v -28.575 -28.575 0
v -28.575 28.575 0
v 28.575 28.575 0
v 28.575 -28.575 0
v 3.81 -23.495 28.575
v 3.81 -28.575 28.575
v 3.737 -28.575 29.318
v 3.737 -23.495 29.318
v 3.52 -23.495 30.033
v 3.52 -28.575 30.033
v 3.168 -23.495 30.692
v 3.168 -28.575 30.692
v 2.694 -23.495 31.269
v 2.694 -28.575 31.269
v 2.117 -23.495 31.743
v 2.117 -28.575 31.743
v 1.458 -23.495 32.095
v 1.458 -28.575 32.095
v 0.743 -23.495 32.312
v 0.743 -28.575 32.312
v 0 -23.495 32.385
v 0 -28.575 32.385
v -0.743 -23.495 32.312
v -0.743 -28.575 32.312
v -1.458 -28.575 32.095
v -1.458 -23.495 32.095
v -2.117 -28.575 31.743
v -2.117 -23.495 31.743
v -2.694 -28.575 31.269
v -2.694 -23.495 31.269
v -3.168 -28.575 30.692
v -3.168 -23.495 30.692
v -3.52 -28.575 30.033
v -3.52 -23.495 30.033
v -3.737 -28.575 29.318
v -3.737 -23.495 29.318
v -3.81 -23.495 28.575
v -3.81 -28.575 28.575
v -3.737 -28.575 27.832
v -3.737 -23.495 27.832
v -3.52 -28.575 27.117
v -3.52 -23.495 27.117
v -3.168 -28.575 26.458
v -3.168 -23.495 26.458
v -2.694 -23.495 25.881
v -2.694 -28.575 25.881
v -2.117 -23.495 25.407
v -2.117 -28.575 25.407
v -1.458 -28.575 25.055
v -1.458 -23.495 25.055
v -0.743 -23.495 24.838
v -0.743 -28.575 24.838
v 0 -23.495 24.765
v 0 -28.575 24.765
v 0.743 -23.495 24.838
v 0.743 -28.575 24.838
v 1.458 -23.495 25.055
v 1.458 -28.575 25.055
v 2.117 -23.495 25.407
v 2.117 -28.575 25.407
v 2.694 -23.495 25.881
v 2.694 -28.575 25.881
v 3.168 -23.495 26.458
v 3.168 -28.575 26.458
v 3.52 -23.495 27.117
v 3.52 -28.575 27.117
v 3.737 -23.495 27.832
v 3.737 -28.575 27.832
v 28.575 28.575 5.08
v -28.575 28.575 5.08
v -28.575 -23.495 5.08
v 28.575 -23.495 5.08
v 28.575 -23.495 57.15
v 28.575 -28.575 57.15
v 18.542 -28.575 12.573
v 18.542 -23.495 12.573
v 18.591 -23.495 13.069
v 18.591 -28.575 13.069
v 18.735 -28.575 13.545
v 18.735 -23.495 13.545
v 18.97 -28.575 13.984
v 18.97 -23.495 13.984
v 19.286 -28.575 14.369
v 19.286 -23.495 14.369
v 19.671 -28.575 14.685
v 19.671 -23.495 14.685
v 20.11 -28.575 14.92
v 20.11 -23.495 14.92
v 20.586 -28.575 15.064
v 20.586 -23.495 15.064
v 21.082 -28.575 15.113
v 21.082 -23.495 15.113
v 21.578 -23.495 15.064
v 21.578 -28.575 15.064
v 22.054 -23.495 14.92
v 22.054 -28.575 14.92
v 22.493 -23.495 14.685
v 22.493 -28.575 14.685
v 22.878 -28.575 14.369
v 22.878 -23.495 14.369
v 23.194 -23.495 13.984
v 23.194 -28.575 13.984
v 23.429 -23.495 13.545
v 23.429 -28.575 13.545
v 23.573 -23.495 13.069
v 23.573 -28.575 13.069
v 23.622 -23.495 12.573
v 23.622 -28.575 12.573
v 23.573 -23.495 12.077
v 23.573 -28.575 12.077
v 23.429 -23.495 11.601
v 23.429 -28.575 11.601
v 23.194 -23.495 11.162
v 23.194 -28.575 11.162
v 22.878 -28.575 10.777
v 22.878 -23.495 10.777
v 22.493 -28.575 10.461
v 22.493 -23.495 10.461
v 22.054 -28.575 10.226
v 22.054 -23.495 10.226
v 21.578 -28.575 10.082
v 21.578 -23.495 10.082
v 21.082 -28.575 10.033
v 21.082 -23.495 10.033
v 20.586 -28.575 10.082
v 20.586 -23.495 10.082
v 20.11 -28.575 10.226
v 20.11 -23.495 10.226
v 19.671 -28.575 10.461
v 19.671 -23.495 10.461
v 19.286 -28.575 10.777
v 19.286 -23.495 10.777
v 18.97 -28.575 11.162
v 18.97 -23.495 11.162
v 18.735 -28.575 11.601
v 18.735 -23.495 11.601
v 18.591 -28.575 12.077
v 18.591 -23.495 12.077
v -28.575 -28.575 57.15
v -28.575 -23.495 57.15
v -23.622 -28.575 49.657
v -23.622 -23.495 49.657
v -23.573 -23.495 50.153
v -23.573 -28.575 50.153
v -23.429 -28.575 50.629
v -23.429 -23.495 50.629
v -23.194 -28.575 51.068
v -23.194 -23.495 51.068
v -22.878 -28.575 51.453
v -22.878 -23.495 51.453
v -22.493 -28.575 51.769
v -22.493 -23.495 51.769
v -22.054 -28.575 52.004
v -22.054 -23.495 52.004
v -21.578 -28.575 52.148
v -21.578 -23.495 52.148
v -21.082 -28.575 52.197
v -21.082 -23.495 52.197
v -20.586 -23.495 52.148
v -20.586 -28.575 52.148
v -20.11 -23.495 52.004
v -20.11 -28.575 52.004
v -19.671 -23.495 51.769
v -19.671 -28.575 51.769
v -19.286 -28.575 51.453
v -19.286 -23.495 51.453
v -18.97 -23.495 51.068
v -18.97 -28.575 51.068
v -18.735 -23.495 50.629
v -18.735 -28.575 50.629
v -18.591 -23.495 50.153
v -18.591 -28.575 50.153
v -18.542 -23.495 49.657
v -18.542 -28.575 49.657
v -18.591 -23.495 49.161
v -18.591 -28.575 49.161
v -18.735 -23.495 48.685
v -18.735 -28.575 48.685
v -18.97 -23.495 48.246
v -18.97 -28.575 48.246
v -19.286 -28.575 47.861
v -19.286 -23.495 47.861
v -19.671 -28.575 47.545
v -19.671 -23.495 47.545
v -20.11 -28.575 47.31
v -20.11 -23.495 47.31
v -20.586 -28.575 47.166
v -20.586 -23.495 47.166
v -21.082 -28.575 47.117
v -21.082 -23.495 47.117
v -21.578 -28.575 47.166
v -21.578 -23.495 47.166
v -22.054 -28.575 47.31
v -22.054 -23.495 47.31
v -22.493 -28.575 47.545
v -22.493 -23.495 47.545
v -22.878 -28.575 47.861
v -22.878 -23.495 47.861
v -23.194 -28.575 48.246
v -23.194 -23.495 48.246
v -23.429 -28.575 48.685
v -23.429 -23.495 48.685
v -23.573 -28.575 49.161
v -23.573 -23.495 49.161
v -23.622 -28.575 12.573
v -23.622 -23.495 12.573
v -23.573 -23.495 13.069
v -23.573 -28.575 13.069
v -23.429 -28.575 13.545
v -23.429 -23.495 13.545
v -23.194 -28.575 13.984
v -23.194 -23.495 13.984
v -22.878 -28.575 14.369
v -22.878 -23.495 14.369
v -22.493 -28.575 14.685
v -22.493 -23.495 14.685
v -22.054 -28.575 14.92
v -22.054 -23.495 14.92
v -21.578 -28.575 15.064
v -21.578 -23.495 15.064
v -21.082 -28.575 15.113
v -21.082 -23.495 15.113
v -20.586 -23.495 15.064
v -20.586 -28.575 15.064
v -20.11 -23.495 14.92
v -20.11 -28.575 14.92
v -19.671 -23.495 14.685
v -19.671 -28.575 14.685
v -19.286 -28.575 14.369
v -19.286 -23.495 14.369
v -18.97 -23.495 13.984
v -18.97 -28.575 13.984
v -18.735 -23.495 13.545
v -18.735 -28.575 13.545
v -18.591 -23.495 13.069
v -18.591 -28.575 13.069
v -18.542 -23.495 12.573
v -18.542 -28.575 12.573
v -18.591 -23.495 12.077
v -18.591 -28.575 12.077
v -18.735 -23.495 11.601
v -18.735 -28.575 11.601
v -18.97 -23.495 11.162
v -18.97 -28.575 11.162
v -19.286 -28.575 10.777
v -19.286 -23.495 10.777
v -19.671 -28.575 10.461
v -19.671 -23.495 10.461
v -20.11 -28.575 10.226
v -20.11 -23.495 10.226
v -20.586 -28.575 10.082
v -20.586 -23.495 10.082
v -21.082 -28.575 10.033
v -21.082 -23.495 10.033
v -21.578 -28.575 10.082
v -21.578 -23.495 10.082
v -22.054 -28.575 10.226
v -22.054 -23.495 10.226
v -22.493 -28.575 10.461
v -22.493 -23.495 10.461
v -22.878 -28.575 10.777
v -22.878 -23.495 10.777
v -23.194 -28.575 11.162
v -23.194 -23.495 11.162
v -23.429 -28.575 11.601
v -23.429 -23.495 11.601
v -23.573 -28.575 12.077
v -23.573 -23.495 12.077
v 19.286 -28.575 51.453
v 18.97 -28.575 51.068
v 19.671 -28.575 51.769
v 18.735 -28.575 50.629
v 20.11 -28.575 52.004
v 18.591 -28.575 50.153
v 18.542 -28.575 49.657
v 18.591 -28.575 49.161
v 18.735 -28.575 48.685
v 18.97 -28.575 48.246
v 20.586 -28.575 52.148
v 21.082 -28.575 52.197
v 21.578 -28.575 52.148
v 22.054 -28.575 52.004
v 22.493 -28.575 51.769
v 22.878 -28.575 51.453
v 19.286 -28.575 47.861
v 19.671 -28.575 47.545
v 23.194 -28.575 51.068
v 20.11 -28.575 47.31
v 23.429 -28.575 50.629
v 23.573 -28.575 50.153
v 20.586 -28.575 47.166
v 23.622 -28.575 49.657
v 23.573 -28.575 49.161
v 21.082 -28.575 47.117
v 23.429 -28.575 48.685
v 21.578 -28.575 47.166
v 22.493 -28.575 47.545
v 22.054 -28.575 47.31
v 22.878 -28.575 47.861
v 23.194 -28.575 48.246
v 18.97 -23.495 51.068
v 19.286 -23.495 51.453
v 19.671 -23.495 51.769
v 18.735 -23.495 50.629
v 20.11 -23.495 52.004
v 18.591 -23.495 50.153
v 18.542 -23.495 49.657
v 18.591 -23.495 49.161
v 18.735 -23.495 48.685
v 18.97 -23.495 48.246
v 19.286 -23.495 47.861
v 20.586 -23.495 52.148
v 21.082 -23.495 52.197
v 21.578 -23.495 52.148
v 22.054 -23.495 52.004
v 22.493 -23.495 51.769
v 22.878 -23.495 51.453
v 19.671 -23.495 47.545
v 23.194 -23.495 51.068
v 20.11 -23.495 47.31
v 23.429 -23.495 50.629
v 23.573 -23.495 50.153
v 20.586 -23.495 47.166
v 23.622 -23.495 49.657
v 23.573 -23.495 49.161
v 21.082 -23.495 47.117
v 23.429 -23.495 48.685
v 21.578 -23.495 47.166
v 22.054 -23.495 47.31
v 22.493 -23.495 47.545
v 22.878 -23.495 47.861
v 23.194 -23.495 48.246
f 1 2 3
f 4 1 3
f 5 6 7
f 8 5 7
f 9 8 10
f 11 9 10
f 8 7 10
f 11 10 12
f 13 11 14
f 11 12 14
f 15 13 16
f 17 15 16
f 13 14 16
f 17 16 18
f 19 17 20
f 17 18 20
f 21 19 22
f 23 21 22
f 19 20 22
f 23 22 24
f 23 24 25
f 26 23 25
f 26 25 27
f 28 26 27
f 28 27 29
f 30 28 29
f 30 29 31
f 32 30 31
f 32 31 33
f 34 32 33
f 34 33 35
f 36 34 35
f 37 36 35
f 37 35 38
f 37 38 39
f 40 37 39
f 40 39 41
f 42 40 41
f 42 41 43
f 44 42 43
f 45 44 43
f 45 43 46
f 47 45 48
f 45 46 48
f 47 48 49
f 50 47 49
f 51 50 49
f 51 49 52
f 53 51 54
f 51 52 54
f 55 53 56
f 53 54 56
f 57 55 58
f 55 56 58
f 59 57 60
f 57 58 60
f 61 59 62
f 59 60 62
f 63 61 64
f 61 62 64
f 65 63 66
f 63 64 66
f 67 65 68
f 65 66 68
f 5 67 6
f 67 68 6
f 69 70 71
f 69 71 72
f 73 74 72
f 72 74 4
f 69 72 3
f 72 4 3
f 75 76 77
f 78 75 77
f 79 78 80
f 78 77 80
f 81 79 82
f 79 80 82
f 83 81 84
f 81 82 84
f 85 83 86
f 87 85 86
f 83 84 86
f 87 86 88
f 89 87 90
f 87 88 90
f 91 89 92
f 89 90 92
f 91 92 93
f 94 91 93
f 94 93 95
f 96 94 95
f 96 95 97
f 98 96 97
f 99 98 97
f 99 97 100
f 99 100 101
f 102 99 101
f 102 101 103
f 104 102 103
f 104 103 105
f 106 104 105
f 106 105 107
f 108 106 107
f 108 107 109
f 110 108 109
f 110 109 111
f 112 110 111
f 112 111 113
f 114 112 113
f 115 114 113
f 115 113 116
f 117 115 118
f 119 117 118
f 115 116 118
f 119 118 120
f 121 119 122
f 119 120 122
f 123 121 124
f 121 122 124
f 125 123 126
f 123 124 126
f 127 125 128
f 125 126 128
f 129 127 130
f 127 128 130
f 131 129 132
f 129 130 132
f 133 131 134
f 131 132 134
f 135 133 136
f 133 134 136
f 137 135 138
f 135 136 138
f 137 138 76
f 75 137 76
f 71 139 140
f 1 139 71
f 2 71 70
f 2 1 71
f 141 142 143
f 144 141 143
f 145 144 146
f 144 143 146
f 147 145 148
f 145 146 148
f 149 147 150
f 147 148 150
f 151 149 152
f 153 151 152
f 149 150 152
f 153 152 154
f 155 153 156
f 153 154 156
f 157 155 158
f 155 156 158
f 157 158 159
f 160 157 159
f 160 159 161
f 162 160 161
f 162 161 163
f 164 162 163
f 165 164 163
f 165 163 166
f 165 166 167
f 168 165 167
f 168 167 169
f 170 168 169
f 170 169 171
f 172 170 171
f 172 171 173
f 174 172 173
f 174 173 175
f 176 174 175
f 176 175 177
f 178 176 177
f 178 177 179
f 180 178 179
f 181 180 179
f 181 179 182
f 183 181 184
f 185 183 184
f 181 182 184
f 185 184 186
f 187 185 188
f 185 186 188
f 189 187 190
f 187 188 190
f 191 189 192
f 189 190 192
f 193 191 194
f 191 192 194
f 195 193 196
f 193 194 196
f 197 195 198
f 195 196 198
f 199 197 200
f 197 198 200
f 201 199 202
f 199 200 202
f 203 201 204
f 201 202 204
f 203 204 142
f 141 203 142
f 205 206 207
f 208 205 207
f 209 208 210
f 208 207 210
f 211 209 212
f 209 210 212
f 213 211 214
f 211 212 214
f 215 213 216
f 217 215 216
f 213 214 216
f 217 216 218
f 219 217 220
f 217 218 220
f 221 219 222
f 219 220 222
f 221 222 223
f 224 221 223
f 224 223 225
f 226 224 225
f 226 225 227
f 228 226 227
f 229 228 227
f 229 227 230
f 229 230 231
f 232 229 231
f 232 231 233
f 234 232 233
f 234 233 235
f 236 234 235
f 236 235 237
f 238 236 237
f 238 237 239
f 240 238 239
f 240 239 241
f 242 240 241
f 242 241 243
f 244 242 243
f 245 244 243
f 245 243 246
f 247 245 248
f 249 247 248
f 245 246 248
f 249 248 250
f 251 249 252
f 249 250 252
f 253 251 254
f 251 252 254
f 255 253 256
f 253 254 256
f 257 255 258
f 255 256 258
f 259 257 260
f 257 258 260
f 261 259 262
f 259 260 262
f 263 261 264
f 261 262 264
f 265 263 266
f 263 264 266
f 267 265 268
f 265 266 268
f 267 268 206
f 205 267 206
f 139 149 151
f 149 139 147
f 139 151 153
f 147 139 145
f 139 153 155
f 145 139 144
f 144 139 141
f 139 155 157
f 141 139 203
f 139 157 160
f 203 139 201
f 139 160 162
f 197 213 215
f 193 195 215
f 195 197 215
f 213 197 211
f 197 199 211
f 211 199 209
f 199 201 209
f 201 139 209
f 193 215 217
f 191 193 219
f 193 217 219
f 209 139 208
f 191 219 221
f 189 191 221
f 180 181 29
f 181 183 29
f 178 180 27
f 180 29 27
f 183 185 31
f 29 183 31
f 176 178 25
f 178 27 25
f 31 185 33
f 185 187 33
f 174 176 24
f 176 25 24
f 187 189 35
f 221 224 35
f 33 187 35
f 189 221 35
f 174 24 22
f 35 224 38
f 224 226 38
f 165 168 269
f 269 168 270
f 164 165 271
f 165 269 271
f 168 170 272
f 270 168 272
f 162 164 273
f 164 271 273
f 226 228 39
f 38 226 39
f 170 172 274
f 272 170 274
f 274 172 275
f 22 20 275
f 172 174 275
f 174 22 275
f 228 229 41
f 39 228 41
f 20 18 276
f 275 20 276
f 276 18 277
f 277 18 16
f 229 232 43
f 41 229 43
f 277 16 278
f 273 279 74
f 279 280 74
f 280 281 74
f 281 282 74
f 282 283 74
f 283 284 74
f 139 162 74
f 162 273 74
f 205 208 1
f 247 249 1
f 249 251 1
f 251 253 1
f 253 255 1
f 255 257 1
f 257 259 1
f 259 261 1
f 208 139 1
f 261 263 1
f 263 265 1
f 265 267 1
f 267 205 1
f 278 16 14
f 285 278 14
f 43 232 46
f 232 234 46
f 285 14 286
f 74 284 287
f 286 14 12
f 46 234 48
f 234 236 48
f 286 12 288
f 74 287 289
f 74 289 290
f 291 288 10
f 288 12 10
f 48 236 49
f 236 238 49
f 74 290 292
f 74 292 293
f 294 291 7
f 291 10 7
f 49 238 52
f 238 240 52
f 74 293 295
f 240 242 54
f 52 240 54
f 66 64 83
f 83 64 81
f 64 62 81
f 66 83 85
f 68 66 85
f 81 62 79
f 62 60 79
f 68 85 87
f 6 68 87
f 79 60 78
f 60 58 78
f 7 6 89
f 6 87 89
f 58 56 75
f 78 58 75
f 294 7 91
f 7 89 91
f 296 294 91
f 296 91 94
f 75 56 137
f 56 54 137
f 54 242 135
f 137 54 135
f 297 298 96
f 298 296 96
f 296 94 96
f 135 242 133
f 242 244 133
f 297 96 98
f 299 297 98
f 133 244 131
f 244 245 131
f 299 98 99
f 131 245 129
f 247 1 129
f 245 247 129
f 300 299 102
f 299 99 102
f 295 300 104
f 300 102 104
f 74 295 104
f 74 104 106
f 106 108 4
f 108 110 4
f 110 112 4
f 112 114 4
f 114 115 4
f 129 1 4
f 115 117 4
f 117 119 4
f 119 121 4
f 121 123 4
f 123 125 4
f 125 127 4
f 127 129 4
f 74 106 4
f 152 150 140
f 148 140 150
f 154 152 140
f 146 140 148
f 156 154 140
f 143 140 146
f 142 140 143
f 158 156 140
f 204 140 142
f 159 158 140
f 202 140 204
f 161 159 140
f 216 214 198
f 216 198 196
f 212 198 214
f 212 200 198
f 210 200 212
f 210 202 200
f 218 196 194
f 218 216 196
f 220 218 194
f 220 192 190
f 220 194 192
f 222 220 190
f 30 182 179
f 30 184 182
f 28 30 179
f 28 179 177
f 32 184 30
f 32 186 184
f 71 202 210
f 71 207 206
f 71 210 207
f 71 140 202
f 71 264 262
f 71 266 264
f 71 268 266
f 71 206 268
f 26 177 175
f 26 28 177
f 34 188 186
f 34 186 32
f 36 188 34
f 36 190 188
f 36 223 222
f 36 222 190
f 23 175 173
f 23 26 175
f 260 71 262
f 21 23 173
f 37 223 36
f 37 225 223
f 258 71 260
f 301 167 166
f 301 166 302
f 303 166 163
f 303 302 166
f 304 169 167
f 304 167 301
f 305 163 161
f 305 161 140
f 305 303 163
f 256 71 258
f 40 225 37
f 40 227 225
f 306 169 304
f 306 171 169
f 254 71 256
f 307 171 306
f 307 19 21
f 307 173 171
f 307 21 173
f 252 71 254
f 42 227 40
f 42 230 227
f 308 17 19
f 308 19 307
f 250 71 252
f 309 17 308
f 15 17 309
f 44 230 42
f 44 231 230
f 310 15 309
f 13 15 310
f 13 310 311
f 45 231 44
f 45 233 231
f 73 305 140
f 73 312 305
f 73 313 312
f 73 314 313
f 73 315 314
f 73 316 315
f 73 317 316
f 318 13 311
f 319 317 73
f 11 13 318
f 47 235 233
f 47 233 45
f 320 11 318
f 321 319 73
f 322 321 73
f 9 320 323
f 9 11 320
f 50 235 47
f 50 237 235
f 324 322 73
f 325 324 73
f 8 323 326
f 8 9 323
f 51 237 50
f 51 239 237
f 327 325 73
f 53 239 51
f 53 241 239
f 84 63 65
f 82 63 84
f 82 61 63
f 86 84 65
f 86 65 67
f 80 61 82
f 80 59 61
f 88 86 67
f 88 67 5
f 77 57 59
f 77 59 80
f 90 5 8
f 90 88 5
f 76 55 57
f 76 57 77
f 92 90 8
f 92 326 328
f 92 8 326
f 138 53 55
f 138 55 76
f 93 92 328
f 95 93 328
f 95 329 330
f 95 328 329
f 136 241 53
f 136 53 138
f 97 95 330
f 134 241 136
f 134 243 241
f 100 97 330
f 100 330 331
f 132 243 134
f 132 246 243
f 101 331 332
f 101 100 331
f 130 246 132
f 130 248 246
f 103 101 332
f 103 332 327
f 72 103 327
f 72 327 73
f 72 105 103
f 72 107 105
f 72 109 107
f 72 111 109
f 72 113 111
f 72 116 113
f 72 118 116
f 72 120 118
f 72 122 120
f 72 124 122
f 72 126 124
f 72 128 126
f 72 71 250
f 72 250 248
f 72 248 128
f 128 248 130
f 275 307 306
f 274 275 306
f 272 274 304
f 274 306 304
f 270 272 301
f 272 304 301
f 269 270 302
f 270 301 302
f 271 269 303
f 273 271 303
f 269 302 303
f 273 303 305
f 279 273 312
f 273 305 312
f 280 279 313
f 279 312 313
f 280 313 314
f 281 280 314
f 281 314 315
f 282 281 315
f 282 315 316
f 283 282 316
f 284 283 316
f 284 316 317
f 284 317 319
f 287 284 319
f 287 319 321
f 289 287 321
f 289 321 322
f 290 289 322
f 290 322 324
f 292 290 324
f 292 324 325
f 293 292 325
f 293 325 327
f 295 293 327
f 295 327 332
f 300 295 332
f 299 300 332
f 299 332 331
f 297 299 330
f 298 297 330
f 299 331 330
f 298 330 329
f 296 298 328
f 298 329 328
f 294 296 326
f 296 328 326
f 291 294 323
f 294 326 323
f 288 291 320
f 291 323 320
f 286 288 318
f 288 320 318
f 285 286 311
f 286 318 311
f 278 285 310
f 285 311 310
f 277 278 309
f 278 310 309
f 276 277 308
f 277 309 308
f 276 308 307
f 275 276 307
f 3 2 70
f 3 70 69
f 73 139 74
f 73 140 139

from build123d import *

# Parameters (mm, degrees)
F0_W     = 57.15
F0_H     = 57.15
F1_DEPTH = 57.15
F2_T     = -5.08
F3_R     = 2.54
F4_DEPTH = 25.4
F5_R     = 3.81
F6_DEPTH = 25.4


with BuildPart() as f1:
    # F0 (on Top) → F1 (new body)
    with BuildSketch(Plane.XY):
        Rectangle(F0_W, F0_H)
    extrude(amount=F1_DEPTH)

    # F2
    f2_openings = [f1.faces().sort_by_distance(p)[0] for p in [
        (0, 0, 57.15),
        (28.575, 0, 28.575),
        (0, 28.575, 28.575),
        (-28.575, 0, 28.575),
    ]]
    offset(amount=F2_T, openings=f2_openings)

    # F3 (on face) → F4 (cut)
    with BuildSketch(Plane(origin=(0, -23.495, 0), x_dir=(-1, 0, 0), z_dir=(0, 1, 0))):
        with Locations((-21.082, 49.657)):
            Circle(F3_R)
        with Locations((21.082, 49.657)):
            Circle(F3_R)
        with Locations((-21.082, 12.573)):
            Circle(F3_R)
        with Locations((21.082, 12.573)):
            Circle(F3_R)
    extrude(amount=-F4_DEPTH, mode=Mode.SUBTRACT)

    # F5 (on face) → F6 (cut)
    with BuildSketch(Plane.XZ.offset(28.575)):
        with Locations((0, 28.575)):
            Circle(F5_R)
    extrude(amount=-F6_DEPTH, mode=Mode.SUBTRACT)


solid = f1.part
